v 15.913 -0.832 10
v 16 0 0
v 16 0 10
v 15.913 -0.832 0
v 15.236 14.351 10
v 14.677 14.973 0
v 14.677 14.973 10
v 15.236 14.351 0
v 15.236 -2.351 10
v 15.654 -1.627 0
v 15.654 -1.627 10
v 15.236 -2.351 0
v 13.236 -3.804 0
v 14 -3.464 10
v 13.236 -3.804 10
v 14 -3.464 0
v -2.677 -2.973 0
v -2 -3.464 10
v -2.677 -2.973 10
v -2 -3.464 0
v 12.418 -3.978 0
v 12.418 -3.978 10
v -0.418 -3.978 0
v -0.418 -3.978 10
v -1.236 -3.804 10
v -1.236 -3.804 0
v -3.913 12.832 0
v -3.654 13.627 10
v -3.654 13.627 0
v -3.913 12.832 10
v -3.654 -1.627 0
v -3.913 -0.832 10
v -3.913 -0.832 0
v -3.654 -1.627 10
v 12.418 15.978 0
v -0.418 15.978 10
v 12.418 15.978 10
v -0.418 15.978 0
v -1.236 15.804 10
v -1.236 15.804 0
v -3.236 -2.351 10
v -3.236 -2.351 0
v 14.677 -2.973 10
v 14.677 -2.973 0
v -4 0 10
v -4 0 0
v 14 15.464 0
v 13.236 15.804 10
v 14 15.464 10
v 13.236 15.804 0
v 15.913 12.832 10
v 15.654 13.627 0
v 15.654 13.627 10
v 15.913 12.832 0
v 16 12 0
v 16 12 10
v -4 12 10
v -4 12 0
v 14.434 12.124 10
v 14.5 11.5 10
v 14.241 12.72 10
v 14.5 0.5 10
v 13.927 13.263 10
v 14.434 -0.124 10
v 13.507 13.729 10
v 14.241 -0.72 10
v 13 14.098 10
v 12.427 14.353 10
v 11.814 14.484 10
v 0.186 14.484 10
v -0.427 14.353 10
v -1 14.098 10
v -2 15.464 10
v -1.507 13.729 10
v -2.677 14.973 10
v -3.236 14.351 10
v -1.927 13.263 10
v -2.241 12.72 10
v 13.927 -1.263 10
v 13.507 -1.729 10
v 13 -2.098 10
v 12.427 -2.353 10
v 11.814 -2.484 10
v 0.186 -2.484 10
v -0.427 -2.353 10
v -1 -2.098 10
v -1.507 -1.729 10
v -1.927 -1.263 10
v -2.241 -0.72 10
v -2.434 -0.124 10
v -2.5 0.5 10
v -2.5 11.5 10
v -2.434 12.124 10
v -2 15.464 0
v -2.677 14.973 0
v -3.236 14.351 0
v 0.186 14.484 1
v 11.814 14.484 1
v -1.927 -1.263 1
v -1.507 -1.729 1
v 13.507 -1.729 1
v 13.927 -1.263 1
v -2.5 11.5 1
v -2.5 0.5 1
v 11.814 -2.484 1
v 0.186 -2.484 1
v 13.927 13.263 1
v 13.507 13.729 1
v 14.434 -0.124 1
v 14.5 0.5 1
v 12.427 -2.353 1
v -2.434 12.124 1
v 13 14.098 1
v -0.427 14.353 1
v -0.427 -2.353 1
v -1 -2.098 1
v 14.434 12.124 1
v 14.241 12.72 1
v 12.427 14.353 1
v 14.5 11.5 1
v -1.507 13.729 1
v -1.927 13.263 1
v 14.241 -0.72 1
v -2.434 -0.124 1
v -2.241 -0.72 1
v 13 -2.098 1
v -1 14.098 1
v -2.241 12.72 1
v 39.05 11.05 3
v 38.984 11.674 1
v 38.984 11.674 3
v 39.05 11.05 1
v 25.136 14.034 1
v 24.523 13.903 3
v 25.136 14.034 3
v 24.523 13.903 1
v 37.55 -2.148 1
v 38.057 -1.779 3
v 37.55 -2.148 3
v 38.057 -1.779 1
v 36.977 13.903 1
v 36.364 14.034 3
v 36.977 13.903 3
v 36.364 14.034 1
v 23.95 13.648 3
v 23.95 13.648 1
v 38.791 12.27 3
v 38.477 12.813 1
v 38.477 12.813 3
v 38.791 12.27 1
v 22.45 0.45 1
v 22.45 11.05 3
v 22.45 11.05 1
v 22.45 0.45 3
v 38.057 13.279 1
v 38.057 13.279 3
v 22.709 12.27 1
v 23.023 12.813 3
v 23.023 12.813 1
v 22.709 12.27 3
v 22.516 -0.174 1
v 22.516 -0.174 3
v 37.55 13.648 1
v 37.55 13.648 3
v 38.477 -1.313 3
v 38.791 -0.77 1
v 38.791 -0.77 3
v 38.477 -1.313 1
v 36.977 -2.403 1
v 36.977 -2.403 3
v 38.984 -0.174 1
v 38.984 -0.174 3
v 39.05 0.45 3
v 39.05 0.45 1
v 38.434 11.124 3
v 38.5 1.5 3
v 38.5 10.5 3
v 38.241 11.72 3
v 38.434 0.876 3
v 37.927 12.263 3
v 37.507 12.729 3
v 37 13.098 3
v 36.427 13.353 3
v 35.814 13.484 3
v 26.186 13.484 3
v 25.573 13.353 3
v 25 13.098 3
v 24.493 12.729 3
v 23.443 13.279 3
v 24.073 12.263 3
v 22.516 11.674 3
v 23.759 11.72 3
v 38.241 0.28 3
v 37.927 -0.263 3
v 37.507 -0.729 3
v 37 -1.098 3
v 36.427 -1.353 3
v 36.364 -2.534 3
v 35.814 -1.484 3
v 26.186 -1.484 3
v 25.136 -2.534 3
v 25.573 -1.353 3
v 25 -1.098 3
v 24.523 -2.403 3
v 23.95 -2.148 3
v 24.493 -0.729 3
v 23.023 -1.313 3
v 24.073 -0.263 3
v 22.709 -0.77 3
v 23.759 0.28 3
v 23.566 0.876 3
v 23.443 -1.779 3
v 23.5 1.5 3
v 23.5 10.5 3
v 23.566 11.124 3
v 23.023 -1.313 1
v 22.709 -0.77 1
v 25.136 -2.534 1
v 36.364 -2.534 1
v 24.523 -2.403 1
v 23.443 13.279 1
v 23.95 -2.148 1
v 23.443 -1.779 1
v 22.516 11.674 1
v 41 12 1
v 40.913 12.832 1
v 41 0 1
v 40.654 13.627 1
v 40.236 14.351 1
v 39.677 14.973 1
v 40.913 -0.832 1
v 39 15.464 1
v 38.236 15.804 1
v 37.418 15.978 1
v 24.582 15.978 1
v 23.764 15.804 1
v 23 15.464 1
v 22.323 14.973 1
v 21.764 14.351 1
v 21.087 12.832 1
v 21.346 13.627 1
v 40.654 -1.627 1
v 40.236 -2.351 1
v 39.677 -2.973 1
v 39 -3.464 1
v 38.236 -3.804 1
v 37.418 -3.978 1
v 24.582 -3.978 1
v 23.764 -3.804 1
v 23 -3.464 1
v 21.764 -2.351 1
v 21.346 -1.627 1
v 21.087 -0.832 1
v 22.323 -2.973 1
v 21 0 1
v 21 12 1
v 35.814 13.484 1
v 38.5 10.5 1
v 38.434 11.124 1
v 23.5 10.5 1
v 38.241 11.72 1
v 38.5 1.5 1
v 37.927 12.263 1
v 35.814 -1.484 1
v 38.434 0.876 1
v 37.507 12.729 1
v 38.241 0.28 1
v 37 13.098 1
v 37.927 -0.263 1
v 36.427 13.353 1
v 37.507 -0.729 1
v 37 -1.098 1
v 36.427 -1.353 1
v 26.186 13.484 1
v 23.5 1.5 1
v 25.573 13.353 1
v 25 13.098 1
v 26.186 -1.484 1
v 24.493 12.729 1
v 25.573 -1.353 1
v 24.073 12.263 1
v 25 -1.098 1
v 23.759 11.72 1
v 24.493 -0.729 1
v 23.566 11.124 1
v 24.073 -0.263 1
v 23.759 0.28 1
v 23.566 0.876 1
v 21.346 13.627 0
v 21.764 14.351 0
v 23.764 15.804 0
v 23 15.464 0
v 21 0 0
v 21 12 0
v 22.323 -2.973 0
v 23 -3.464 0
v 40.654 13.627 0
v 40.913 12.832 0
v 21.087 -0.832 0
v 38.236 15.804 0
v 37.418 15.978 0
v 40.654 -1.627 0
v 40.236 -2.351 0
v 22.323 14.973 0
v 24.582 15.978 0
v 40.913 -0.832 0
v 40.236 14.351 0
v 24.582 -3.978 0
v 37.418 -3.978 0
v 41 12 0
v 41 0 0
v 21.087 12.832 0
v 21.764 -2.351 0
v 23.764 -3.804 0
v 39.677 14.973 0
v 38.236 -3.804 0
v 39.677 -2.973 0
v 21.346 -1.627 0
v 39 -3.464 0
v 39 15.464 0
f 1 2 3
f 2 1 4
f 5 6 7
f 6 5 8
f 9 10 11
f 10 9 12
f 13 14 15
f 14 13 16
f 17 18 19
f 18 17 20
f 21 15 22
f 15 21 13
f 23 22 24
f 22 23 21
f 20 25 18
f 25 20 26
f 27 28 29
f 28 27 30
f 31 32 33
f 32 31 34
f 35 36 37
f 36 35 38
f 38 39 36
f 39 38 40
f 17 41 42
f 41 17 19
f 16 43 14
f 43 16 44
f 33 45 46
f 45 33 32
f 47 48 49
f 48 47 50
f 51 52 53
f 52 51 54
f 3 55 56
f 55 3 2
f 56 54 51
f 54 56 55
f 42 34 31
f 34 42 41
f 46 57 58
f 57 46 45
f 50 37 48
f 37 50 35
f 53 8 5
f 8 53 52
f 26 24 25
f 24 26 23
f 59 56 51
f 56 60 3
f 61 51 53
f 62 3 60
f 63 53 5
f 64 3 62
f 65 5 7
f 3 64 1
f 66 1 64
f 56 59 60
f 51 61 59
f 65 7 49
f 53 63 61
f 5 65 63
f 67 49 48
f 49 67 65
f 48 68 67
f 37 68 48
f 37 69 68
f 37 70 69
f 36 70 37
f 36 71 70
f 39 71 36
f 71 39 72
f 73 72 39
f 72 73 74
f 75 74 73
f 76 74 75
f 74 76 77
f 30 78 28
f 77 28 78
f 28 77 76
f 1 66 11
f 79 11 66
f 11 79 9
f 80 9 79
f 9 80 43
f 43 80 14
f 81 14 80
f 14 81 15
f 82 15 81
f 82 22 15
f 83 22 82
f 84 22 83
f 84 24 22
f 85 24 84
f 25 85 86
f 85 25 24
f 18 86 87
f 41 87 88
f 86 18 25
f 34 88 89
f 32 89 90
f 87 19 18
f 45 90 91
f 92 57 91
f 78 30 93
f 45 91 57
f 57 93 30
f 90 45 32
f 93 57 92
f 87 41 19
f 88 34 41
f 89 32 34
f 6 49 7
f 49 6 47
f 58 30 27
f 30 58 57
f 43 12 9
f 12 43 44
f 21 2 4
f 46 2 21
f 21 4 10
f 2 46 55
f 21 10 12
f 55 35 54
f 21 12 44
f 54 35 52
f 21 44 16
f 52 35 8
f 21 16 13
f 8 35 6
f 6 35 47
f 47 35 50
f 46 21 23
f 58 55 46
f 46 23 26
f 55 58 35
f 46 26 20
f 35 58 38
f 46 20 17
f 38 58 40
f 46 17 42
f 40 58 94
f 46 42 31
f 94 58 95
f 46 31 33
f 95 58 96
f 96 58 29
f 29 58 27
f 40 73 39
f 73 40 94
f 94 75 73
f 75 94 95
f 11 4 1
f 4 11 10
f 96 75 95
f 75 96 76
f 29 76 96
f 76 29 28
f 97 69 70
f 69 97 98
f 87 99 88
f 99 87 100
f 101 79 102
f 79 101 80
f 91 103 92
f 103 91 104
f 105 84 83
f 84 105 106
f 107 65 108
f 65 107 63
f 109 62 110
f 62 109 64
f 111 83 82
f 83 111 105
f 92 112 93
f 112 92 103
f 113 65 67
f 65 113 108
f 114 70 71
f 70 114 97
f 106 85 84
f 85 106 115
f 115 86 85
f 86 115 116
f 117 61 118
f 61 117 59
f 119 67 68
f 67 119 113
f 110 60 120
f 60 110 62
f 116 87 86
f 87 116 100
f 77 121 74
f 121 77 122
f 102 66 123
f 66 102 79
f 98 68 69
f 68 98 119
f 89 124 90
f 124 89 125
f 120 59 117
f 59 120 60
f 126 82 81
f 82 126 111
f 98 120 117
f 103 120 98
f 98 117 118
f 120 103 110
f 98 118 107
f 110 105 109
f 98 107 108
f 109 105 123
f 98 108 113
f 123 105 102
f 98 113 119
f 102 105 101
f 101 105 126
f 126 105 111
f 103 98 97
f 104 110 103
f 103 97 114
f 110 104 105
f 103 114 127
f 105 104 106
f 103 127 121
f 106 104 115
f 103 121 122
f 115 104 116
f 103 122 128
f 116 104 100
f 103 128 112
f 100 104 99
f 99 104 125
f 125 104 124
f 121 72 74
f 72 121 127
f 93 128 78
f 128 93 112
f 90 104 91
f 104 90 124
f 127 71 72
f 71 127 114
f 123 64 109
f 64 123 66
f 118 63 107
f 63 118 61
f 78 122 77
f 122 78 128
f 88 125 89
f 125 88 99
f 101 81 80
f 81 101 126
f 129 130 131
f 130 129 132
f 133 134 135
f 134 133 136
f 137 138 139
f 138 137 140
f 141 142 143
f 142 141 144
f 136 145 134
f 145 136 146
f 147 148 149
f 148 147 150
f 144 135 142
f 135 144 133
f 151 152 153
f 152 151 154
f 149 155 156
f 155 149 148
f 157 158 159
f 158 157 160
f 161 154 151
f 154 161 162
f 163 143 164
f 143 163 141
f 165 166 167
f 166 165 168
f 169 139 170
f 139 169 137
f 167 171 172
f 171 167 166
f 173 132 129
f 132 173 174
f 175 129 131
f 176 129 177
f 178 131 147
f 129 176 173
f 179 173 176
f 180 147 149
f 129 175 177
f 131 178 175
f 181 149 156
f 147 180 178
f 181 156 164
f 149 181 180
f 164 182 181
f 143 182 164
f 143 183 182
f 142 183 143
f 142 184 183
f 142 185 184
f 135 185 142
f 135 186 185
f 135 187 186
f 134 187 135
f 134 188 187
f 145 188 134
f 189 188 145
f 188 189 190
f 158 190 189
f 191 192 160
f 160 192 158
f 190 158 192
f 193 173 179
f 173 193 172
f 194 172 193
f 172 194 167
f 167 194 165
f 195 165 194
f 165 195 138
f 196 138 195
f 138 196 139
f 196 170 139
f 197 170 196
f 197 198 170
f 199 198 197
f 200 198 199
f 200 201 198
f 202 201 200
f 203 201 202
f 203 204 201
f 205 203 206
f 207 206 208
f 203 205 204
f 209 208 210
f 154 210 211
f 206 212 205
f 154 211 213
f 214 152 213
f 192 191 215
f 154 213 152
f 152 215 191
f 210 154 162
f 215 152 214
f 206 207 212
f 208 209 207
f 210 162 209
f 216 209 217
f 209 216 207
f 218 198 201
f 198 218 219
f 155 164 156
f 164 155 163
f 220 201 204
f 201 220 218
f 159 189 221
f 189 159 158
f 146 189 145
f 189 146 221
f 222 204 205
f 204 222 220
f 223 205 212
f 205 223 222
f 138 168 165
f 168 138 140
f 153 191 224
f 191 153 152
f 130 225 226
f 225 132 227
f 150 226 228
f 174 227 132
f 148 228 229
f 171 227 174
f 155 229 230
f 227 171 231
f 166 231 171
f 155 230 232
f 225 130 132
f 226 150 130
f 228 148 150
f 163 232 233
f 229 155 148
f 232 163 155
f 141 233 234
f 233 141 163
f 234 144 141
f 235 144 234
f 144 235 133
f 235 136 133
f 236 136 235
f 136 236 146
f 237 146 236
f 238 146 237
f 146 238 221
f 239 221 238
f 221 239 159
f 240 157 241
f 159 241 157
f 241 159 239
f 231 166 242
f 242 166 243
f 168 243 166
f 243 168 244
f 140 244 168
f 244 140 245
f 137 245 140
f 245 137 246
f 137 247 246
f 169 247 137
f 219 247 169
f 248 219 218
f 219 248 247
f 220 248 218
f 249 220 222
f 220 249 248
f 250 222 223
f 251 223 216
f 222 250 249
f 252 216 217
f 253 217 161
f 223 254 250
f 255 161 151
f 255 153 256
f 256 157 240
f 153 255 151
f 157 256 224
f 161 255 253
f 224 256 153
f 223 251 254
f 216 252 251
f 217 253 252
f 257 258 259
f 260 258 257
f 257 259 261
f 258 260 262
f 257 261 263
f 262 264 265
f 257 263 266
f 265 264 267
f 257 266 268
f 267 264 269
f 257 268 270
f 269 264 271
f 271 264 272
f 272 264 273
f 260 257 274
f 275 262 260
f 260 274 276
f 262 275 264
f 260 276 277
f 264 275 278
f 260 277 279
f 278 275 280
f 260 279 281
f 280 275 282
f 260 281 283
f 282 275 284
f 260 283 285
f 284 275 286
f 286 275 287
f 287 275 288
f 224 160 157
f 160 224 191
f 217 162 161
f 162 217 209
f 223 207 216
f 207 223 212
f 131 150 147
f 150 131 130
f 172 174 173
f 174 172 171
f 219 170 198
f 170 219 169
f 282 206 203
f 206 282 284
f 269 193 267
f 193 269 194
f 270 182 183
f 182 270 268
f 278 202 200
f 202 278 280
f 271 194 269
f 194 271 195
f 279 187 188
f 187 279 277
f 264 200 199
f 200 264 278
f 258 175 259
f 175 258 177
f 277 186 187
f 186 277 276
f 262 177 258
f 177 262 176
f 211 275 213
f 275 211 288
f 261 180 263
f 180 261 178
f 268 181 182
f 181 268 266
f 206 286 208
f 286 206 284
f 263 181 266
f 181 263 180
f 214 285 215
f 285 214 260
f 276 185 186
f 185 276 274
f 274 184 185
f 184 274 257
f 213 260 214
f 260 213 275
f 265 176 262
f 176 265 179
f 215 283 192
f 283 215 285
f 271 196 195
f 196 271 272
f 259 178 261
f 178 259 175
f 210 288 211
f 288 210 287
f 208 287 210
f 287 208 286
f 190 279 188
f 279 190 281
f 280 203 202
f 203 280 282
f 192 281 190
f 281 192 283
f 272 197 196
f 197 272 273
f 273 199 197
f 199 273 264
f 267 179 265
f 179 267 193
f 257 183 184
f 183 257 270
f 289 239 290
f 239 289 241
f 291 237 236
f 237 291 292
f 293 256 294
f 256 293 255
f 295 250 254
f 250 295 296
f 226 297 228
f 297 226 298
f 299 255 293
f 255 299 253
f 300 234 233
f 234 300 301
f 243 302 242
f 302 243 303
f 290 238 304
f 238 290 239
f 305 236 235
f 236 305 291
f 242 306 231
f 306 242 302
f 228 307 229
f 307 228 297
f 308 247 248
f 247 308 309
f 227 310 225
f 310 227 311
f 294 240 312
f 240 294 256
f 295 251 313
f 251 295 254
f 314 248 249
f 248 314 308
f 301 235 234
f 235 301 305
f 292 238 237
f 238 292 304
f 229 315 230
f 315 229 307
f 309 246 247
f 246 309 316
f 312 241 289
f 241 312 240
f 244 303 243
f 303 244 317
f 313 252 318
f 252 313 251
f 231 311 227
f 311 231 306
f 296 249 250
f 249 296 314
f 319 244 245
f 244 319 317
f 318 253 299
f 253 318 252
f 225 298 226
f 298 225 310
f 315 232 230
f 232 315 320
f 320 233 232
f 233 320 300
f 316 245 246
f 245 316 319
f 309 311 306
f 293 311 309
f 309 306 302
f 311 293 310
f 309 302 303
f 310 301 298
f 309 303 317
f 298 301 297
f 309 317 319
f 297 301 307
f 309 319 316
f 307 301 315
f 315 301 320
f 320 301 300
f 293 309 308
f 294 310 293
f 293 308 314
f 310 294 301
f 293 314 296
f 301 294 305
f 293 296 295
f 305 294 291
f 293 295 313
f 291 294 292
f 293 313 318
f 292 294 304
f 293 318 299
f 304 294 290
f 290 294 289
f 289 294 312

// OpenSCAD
// Another Customizable Rounded Corner box
// Hari Wiguna, Dec 2013

// Box Outer dimensions (in mmm)
Width = 20;
Depth = 20;
Height = 10;
Radius = 4;
WallThickness = 1;

// Lip at bottom of the lid that fits into the box
LipHeight = 2;

// Clearance between the lid lip and the box inside. Smaller = Tighter fit
Clearance = 0.2;

// Curve resolution (higher=smoother)
$fn=30;
Width2 = Width - WallThickness;
Depth2 = Depth - WallThickness;
Radius2 = Radius - WallThickness;
Height2 = Height - WallThickness;

Width3 = Width2 - 2*WallThickness;
Depth3 = Depth2 - 2*WallThickness;

Box();
translate([Width+5,0,0]) LidWithLip();

module LidWithLip()
{
	union()
	{
		Lid();
		LidLip();
	}
}

module Lid()
{
	minkowski()
	{
		cube([Width-2*Radius,Depth-2*Radius,WallThickness/2]);
		cylinder(WallThickness/2,Radius,Radius);
	}
}

module LidLip()
{
	difference()
	{
		translate([WallThickness/4+Clearance,WallThickness/4+Clearance,WallThickness])
		minkowski()
		{
			cube([Width2-2*Radius-2*Clearance, Depth2-2*Radius-2*Clearance, LipHeight/2]);
			cylinder(LipHeight/2, Radius2, Radius2);
		}

		translate([WallThickness*1.5,WallThickness*1.5,WallThickness])
		minkowski()
		{
			cube([Width3-2*Radius, Depth3-2*Radius, LipHeight/2]);
			cylinder(LipHeight/2, Radius2, Radius2);
		}
	}
}

module Box()
{
	difference()
	{
		OuterShell();
		InnerShell();
	}
}

module OuterShell()
{
	minkowski()
	{
		cube([Width-2*Radius,Depth-2*Radius,Height/2]);
		cylinder(Height/2,Radius,Radius);
	}
}


module InnerShell()
{
	translate([WallThickness/2,WallThickness/2,WallThickness])
	minkowski()
	{
		cube([Width2-(2*Radius), Depth2-(2*Radius), Height/2]);
		cylinder(Height2/2, Radius2, Radius2);
	}
}
